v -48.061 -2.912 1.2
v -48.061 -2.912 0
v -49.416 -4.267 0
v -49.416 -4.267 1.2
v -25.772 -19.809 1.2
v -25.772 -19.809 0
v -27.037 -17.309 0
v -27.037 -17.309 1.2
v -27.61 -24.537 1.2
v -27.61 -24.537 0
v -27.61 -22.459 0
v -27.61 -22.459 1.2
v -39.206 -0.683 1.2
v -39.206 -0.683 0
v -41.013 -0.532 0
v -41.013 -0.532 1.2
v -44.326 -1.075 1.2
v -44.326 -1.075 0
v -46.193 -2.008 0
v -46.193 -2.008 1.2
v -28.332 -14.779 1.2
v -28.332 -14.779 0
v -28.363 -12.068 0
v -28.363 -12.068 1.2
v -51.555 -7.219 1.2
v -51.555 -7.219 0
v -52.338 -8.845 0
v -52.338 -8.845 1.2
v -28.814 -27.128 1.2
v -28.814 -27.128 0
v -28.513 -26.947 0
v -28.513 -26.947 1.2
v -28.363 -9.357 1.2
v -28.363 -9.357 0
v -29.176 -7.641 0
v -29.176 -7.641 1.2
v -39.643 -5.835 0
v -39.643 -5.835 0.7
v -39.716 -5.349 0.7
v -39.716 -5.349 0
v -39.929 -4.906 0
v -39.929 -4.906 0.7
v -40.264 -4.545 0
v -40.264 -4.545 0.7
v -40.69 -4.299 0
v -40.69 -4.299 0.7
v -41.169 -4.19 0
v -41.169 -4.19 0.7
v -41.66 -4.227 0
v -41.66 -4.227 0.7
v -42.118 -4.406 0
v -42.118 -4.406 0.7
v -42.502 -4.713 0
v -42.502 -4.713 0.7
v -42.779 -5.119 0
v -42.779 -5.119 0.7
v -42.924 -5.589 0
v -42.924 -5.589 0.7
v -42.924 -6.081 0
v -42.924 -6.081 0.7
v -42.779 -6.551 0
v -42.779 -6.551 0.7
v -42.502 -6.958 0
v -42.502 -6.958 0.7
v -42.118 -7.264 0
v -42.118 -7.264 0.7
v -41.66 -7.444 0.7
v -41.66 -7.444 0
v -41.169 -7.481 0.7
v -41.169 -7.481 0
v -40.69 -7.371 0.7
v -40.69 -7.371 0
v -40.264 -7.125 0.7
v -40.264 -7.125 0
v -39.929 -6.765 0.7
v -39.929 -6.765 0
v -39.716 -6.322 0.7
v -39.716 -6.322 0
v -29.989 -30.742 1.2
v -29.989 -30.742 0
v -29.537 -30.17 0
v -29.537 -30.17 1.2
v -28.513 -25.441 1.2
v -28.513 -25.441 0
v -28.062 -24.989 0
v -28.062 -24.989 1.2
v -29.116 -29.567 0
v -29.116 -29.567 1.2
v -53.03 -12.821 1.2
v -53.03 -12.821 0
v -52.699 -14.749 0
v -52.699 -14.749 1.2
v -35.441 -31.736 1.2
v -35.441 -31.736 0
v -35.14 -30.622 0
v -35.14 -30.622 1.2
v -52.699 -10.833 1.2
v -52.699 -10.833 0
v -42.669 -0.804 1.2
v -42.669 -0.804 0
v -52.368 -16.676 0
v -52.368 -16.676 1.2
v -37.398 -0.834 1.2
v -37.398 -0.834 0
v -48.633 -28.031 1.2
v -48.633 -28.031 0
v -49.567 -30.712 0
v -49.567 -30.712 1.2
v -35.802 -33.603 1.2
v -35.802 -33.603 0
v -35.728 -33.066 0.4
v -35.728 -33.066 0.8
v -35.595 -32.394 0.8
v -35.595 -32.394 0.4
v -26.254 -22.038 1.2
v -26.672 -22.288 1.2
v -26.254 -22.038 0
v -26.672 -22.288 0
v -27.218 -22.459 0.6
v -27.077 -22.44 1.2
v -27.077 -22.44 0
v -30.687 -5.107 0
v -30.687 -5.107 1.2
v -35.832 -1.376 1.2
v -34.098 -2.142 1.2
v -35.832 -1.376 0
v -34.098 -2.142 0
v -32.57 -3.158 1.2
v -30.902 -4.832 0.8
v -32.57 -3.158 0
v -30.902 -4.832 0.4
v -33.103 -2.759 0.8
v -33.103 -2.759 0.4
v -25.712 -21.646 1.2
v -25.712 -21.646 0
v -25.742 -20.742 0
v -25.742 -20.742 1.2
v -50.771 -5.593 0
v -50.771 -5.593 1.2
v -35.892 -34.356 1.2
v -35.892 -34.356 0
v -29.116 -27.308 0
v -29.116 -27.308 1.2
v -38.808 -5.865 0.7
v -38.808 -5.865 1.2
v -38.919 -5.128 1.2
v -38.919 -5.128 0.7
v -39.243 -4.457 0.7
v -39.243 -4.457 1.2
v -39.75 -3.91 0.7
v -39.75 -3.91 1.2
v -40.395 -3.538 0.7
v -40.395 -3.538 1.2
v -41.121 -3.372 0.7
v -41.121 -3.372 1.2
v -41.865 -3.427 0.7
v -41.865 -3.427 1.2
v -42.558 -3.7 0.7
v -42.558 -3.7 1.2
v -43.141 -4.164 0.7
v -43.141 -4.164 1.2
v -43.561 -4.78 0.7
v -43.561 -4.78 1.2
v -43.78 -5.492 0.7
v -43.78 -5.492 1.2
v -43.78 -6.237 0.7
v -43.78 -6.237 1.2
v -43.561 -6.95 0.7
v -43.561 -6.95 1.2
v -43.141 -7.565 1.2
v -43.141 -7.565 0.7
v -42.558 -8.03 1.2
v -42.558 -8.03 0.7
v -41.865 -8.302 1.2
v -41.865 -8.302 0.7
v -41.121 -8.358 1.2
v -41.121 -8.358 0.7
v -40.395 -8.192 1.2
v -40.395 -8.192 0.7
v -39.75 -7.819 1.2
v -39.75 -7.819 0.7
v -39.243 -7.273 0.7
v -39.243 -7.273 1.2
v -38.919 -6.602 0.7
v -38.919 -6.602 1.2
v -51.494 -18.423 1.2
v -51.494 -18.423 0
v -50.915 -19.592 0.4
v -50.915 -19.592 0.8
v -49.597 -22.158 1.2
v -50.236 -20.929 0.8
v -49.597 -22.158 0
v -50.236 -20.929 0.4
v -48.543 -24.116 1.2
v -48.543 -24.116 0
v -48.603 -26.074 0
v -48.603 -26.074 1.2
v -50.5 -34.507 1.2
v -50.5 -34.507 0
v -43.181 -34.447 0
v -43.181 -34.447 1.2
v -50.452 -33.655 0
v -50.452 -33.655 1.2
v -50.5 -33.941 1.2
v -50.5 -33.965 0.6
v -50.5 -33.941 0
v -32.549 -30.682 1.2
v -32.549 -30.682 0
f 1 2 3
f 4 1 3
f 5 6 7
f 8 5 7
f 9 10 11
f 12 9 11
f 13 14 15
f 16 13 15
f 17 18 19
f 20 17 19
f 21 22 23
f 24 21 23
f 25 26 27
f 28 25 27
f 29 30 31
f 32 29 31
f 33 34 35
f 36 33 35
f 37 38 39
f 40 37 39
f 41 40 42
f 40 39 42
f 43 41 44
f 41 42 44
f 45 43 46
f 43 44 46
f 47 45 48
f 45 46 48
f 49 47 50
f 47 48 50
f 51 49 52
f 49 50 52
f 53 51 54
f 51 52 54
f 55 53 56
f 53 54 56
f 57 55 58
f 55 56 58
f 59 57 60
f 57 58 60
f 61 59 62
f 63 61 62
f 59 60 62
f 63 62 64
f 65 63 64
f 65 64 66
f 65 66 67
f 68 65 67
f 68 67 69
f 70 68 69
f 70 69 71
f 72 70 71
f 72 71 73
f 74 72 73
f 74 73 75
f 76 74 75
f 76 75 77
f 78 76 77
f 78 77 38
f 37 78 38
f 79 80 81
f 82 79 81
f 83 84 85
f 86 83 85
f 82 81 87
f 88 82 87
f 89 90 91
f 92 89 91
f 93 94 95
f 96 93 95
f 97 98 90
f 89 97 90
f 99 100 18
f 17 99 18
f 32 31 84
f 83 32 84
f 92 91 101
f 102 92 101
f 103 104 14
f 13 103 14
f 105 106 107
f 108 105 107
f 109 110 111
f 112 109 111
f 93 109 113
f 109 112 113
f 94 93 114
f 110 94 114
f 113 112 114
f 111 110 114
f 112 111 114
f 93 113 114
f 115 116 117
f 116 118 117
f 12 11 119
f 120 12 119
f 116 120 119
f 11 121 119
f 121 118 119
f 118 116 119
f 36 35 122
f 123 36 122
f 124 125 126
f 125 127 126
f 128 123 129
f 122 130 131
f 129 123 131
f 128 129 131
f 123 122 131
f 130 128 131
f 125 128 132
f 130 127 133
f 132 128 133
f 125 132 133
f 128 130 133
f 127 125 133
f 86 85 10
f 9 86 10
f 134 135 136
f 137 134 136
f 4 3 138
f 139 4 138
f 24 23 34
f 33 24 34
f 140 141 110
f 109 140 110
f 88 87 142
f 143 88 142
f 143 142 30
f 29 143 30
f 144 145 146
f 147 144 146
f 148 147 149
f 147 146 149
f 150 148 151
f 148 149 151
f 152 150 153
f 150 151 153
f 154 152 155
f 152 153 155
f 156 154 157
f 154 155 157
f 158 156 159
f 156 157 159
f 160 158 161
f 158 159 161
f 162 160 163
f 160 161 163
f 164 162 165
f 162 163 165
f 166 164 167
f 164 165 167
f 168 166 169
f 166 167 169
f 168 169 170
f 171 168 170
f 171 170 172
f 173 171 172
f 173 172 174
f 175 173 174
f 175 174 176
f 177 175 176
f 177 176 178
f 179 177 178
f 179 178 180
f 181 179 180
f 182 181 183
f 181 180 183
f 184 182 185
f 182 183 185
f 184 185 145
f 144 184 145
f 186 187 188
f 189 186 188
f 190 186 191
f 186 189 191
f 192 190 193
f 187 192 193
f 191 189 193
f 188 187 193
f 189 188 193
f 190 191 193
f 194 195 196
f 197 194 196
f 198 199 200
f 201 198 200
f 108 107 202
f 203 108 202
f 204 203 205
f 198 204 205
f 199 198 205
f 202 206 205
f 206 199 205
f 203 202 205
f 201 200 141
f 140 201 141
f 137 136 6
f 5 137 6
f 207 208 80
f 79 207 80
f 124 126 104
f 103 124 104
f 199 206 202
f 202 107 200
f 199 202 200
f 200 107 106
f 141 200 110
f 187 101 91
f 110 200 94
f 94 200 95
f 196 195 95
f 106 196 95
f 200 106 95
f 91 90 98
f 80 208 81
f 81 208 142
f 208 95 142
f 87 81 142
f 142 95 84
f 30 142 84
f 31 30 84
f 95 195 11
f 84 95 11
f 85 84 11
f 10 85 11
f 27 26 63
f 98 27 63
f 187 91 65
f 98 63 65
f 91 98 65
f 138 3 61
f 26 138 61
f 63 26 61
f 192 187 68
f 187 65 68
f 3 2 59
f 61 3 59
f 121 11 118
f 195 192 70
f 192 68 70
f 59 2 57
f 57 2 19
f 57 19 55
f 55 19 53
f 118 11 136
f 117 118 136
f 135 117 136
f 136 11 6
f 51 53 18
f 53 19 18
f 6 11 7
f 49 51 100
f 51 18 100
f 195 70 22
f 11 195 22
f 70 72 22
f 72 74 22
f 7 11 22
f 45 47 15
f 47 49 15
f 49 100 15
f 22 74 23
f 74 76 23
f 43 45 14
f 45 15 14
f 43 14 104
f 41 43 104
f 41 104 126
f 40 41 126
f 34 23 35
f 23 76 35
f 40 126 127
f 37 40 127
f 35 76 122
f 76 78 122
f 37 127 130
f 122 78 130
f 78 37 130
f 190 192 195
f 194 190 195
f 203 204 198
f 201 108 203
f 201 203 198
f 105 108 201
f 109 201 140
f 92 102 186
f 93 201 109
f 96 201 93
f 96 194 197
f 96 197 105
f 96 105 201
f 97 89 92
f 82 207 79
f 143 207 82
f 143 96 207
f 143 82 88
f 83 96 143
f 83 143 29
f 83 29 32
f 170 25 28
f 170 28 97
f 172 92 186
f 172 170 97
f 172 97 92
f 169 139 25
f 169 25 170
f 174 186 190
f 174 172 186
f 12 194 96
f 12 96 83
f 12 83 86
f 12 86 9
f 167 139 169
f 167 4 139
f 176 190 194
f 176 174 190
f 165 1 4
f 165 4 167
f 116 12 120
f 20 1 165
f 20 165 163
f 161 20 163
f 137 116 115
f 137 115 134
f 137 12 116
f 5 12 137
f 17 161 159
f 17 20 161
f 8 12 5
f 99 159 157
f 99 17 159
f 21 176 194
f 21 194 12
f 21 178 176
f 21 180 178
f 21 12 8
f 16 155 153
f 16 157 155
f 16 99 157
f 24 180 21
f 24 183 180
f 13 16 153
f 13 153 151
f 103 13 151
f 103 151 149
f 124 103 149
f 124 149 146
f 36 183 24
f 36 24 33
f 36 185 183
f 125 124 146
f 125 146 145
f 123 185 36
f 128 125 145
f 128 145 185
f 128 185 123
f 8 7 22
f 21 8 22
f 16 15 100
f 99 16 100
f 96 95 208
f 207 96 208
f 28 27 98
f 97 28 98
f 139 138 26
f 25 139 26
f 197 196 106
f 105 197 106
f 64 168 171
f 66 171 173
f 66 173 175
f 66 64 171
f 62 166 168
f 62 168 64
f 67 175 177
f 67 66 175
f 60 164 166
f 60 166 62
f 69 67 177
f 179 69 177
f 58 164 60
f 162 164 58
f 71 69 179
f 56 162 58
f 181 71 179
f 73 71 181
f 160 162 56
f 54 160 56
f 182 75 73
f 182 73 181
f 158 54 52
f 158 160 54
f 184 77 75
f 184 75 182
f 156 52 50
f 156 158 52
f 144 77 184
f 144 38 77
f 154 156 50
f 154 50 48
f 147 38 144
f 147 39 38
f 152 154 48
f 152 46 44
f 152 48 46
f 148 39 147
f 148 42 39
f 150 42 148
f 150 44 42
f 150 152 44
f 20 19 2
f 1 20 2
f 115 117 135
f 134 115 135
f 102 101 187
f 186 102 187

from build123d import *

# Parameters (mm, degrees)
PAD007_DEPTH    = 1.2
SKETCH024_R     = 1.65
POCKET008_DEPTH = 2
SKETCH027_R     = 2.5
POCKET009_DEPTH = 0.5


with BuildPart() as part:
    # Sketch023 → Pad007 (new body)
    with BuildSketch(Plane.XY):
        with BuildLine():
            add(Edge.make_bspline(
                [(-42.6694, -0.803536), (-44.3258, -1.0746)],
                knots=[0, 0, 1, 1], degree=1))
            add(Edge.make_bspline(
                [(-44.3258, -1.0746), (-46.1933, -2.00829)],
                knots=[0, 0, 1, 1], degree=1))
            add(Edge.make_bspline(
                [(-46.1933, -2.00829), (-48.0606, -2.91193)],
                knots=[0, 0, 1, 1], degree=1))
            add(Edge.make_bspline(
                [(-48.0606, -2.91193), (-49.416, -4.2673)],
                knots=[0, 0, 1, 1], degree=1))
            add(Edge.make_bspline(
                [(-49.416, -4.2673), (-50.7713, -5.59253)],
                knots=[0, 0, 1, 1], degree=1))
            add(Edge.make_bspline(
                [(-50.7713, -5.59253), (-51.5546, -7.21901)],
                knots=[0, 0, 1, 1], degree=1))
            add(Edge.make_bspline(
                [(-51.5546, -7.21901), (-52.3375, -8.84539)],
                knots=[0, 0, 1, 1], degree=1))
            add(Edge.make_bspline(
                [(-52.3375, -8.84539), (-52.6991, -10.8332)],
                knots=[0, 0, 1, 1], degree=1))
            add(Edge.make_bspline(
                [(-52.6991, -10.8332), (-53.0303, -12.821)],
                knots=[0, 0, 1, 1], degree=1))
            add(Edge.make_bspline(
                [(-53.0303, -12.821), (-52.6991, -14.7486)],
                knots=[0, 0, 1, 1], degree=1))
            add(Edge.make_bspline(
                [(-52.6991, -14.7486), (-52.3677, -16.6761)],
                knots=[0, 0, 1, 1], degree=1))
            add(Edge.make_bspline(
                [(-52.3677, -16.6761), (-51.4942, -18.4232)],
                knots=[0, 0, 1, 1], degree=1))
            add(Edge.make_bspline(
                [(-51.4942, -18.4232), (-51.0125, -19.4171), (-50.169, -21.0738), (-49.5969, -22.1579)],
                knots=[0, 0, 0, 0, 1, 1, 1, 1], degree=3))
            add(Edge.make_bspline(
                [(-49.5969, -22.1579), (-48.5426, -24.1156)],
                knots=[0, 0, 1, 1], degree=1))
            add(Edge.make_bspline(
                [(-48.5426, -24.1156), (-48.6029, -26.0735)],
                knots=[0, 0, 1, 1], degree=1))
            add(Edge.make_bspline(
                [(-48.6029, -26.0735), (-48.633, -28.0312)],
                knots=[0, 0, 1, 1], degree=1))
            add(Edge.make_bspline(
                [(-48.633, -28.0312), (-49.5666, -30.7118)],
                knots=[0, 0, 1, 1], degree=1))
            add(Edge.make_bspline(
                [(-49.5666, -30.7118), (-50.0786, -32.2177), (-50.5003, -33.6636), (-50.5003, -33.9647)],
                knots=[0, 0, 0, 0, 1, 1, 1, 1], degree=3))
            add(Edge.make_bspline(
                [(-50.5003, -33.9647), (-50.5003, -34.5068)],
                knots=[0, 0, 1, 1], degree=1))
            add(Edge.make_bspline(
                [(-50.5003, -34.5068), (-43.1814, -34.4466)],
                knots=[0, 0, 1, 1], degree=1))
            add(Edge.make_bspline(
                [(-43.1814, -34.4466), (-35.8925, -34.3562)],
                knots=[0, 0, 1, 1], degree=1))
            add(Edge.make_bspline(
                [(-35.8925, -34.3562), (-35.8022, -33.6033)],
                knots=[0, 0, 1, 1], degree=1))
            add(Edge.make_bspline(
                [(-35.8022, -33.6033), (-35.7719, -33.1816), (-35.5913, -32.3382), (-35.4407, -31.7358)],
                knots=[0, 0, 0, 0, 1, 1, 1, 1], degree=3))
            add(Edge.make_bspline(
                [(-35.4407, -31.7358), (-35.1396, -30.6215)],
                knots=[0, 0, 1, 1], degree=1))
            add(Edge.make_bspline(
                [(-35.1396, -30.6215), (-32.5493, -30.6816)],
                knots=[0, 0, 1, 1], degree=1))
            add(Edge.make_bspline(
                [(-32.5493, -30.6816), (-29.989, -30.7419)],
                knots=[0, 0, 1, 1], degree=1))
            add(Edge.make_bspline(
                [(-29.989, -30.7419), (-29.5373, -30.1696)],
                knots=[0, 0, 1, 1], degree=1))
            add(Edge.make_bspline(
                [(-29.5373, -30.1696), (-29.1158, -29.5673)],
                knots=[0, 0, 1, 1], degree=1))
            add(Edge.make_bspline(
                [(-29.1158, -29.5673), (-29.1158, -28.4529)],
                knots=[0, 0, 1, 1], degree=1))
            add(Edge.make_bspline(
                [(-29.1158, -28.4529), (-29.1158, -27.3083)],
                knots=[0, 0, 1, 1], degree=1))
            add(Edge.make_bspline(
                [(-29.1158, -27.3083), (-28.8144, -27.1275)],
                knots=[0, 0, 1, 1], degree=1))
            add(Edge.make_bspline(
                [(-28.8144, -27.1275), (-28.5133, -26.9469)],
                knots=[0, 0, 1, 1], degree=1))
            add(Edge.make_bspline(
                [(-28.5133, -26.9469), (-28.5133, -26.194)],
                knots=[0, 0, 1, 1], degree=1))
            add(Edge.make_bspline(
                [(-28.5133, -26.194), (-28.5133, -25.4409)],
                knots=[0, 0, 1, 1], degree=1))
            add(Edge.make_bspline(
                [(-28.5133, -25.4409), (-28.0615, -24.9893)],
                knots=[0, 0, 1, 1], degree=1))
            add(Edge.make_bspline(
                [(-28.0615, -24.9893), (-27.6097, -24.5374)],
                knots=[0, 0, 1, 1], degree=1))
            add(Edge.make_bspline(
                [(-27.6097, -24.5374), (-27.6097, -23.4833)],
                knots=[0, 0, 1, 1], degree=1))
            add(Edge.make_bspline(
                [(-27.6097, -23.4833), (-27.6097, -22.4591)],
                knots=[0, 0, 1, 1], degree=1))
            add(Edge.make_bspline(
                [(-27.6097, -22.4591), (-27.2181, -22.4591)],
                knots=[0, 0, 1, 1], degree=1))
            add(Edge.make_bspline(
                [(-27.2181, -22.4591), (-27.0074, -22.4591), (-26.5857, -22.2785), (-26.2543, -22.0375)],
                knots=[0, 0, 0, 0, 1, 1, 1, 1], degree=3))
            add(Edge.make_bspline(
                [(-26.2543, -22.0375), (-25.7121, -21.6458)],
                knots=[0, 0, 1, 1], degree=1))
            add(Edge.make_bspline(
                [(-25.7121, -21.6458), (-25.7423, -20.7422)],
                knots=[0, 0, 1, 1], degree=1))
            add(Edge.make_bspline(
                [(-25.7423, -20.7422), (-25.7723, -19.8086)],
                knots=[0, 0, 1, 1], degree=1))
            add(Edge.make_bspline(
                [(-25.7723, -19.8086), (-27.0374, -17.3087)],
                knots=[0, 0, 1, 1], degree=1))
            add(Edge.make_bspline(
                [(-27.0374, -17.3087), (-28.3325, -14.7786)],
                knots=[0, 0, 1, 1], degree=1))
            add(Edge.make_bspline(
                [(-28.3325, -14.7786), (-28.3626, -12.068)],
                knots=[0, 0, 1, 1], degree=1))
            add(Edge.make_bspline(
                [(-28.3626, -12.068), (-28.3626, -9.35744)],
                knots=[0, 0, 1, 1], degree=1))
            add(Edge.make_bspline(
                [(-28.3626, -9.35744), (-29.176, -7.64057)],
                knots=[0, 0, 1, 1], degree=1))
            add(Edge.make_bspline(
                [(-29.176, -7.64057), (-30.682, -4.44797), (-32.8203, -2.42997), (-35.8323, -1.37582)],
                knots=[0, 0, 0, 0, 1, 1, 1, 1], degree=3))
            add(Edge.make_bspline(
                [(-35.8323, -1.37582), (-37.3984, -0.833671)],
                knots=[0, 0, 1, 1], degree=1))
            add(Edge.make_bspline(
                [(-37.3984, -0.833671), (-39.2056, -0.683074)],
                knots=[0, 0, 1, 1], degree=1))
            add(Edge.make_bspline(
                [(-39.2056, -0.683074), (-41.0128, -0.532468)],
                knots=[0, 0, 1, 1], degree=1))
            add(Edge.make_bspline(
                [(-41.0128, -0.532468), (-42.6694, -0.803536)],
                knots=[0, 0, 1, 1], degree=1))
        make_face()
    extrude(amount=PAD007_DEPTH)

    # Sketch024 (on Face55 of Pad007) → Pocket008 (cut)
    with BuildSketch(Plane.XY.offset(1.2)):
        with Locations((-41.29277, -5.835361)):
            Circle(SKETCH024_R)
    extrude(amount=-POCKET008_DEPTH, mode=Mode.SUBTRACT)

    # Sketch027 (on Face5 of Pocket008) → Pocket009 (cut)
    with BuildSketch(Plane.XY.offset(1.2)):
        with Locations((-41.308281, -5.86481)):
            Circle(SKETCH027_R)
    extrude(amount=-POCKET009_DEPTH, mode=Mode.SUBTRACT)


solid = part.part
